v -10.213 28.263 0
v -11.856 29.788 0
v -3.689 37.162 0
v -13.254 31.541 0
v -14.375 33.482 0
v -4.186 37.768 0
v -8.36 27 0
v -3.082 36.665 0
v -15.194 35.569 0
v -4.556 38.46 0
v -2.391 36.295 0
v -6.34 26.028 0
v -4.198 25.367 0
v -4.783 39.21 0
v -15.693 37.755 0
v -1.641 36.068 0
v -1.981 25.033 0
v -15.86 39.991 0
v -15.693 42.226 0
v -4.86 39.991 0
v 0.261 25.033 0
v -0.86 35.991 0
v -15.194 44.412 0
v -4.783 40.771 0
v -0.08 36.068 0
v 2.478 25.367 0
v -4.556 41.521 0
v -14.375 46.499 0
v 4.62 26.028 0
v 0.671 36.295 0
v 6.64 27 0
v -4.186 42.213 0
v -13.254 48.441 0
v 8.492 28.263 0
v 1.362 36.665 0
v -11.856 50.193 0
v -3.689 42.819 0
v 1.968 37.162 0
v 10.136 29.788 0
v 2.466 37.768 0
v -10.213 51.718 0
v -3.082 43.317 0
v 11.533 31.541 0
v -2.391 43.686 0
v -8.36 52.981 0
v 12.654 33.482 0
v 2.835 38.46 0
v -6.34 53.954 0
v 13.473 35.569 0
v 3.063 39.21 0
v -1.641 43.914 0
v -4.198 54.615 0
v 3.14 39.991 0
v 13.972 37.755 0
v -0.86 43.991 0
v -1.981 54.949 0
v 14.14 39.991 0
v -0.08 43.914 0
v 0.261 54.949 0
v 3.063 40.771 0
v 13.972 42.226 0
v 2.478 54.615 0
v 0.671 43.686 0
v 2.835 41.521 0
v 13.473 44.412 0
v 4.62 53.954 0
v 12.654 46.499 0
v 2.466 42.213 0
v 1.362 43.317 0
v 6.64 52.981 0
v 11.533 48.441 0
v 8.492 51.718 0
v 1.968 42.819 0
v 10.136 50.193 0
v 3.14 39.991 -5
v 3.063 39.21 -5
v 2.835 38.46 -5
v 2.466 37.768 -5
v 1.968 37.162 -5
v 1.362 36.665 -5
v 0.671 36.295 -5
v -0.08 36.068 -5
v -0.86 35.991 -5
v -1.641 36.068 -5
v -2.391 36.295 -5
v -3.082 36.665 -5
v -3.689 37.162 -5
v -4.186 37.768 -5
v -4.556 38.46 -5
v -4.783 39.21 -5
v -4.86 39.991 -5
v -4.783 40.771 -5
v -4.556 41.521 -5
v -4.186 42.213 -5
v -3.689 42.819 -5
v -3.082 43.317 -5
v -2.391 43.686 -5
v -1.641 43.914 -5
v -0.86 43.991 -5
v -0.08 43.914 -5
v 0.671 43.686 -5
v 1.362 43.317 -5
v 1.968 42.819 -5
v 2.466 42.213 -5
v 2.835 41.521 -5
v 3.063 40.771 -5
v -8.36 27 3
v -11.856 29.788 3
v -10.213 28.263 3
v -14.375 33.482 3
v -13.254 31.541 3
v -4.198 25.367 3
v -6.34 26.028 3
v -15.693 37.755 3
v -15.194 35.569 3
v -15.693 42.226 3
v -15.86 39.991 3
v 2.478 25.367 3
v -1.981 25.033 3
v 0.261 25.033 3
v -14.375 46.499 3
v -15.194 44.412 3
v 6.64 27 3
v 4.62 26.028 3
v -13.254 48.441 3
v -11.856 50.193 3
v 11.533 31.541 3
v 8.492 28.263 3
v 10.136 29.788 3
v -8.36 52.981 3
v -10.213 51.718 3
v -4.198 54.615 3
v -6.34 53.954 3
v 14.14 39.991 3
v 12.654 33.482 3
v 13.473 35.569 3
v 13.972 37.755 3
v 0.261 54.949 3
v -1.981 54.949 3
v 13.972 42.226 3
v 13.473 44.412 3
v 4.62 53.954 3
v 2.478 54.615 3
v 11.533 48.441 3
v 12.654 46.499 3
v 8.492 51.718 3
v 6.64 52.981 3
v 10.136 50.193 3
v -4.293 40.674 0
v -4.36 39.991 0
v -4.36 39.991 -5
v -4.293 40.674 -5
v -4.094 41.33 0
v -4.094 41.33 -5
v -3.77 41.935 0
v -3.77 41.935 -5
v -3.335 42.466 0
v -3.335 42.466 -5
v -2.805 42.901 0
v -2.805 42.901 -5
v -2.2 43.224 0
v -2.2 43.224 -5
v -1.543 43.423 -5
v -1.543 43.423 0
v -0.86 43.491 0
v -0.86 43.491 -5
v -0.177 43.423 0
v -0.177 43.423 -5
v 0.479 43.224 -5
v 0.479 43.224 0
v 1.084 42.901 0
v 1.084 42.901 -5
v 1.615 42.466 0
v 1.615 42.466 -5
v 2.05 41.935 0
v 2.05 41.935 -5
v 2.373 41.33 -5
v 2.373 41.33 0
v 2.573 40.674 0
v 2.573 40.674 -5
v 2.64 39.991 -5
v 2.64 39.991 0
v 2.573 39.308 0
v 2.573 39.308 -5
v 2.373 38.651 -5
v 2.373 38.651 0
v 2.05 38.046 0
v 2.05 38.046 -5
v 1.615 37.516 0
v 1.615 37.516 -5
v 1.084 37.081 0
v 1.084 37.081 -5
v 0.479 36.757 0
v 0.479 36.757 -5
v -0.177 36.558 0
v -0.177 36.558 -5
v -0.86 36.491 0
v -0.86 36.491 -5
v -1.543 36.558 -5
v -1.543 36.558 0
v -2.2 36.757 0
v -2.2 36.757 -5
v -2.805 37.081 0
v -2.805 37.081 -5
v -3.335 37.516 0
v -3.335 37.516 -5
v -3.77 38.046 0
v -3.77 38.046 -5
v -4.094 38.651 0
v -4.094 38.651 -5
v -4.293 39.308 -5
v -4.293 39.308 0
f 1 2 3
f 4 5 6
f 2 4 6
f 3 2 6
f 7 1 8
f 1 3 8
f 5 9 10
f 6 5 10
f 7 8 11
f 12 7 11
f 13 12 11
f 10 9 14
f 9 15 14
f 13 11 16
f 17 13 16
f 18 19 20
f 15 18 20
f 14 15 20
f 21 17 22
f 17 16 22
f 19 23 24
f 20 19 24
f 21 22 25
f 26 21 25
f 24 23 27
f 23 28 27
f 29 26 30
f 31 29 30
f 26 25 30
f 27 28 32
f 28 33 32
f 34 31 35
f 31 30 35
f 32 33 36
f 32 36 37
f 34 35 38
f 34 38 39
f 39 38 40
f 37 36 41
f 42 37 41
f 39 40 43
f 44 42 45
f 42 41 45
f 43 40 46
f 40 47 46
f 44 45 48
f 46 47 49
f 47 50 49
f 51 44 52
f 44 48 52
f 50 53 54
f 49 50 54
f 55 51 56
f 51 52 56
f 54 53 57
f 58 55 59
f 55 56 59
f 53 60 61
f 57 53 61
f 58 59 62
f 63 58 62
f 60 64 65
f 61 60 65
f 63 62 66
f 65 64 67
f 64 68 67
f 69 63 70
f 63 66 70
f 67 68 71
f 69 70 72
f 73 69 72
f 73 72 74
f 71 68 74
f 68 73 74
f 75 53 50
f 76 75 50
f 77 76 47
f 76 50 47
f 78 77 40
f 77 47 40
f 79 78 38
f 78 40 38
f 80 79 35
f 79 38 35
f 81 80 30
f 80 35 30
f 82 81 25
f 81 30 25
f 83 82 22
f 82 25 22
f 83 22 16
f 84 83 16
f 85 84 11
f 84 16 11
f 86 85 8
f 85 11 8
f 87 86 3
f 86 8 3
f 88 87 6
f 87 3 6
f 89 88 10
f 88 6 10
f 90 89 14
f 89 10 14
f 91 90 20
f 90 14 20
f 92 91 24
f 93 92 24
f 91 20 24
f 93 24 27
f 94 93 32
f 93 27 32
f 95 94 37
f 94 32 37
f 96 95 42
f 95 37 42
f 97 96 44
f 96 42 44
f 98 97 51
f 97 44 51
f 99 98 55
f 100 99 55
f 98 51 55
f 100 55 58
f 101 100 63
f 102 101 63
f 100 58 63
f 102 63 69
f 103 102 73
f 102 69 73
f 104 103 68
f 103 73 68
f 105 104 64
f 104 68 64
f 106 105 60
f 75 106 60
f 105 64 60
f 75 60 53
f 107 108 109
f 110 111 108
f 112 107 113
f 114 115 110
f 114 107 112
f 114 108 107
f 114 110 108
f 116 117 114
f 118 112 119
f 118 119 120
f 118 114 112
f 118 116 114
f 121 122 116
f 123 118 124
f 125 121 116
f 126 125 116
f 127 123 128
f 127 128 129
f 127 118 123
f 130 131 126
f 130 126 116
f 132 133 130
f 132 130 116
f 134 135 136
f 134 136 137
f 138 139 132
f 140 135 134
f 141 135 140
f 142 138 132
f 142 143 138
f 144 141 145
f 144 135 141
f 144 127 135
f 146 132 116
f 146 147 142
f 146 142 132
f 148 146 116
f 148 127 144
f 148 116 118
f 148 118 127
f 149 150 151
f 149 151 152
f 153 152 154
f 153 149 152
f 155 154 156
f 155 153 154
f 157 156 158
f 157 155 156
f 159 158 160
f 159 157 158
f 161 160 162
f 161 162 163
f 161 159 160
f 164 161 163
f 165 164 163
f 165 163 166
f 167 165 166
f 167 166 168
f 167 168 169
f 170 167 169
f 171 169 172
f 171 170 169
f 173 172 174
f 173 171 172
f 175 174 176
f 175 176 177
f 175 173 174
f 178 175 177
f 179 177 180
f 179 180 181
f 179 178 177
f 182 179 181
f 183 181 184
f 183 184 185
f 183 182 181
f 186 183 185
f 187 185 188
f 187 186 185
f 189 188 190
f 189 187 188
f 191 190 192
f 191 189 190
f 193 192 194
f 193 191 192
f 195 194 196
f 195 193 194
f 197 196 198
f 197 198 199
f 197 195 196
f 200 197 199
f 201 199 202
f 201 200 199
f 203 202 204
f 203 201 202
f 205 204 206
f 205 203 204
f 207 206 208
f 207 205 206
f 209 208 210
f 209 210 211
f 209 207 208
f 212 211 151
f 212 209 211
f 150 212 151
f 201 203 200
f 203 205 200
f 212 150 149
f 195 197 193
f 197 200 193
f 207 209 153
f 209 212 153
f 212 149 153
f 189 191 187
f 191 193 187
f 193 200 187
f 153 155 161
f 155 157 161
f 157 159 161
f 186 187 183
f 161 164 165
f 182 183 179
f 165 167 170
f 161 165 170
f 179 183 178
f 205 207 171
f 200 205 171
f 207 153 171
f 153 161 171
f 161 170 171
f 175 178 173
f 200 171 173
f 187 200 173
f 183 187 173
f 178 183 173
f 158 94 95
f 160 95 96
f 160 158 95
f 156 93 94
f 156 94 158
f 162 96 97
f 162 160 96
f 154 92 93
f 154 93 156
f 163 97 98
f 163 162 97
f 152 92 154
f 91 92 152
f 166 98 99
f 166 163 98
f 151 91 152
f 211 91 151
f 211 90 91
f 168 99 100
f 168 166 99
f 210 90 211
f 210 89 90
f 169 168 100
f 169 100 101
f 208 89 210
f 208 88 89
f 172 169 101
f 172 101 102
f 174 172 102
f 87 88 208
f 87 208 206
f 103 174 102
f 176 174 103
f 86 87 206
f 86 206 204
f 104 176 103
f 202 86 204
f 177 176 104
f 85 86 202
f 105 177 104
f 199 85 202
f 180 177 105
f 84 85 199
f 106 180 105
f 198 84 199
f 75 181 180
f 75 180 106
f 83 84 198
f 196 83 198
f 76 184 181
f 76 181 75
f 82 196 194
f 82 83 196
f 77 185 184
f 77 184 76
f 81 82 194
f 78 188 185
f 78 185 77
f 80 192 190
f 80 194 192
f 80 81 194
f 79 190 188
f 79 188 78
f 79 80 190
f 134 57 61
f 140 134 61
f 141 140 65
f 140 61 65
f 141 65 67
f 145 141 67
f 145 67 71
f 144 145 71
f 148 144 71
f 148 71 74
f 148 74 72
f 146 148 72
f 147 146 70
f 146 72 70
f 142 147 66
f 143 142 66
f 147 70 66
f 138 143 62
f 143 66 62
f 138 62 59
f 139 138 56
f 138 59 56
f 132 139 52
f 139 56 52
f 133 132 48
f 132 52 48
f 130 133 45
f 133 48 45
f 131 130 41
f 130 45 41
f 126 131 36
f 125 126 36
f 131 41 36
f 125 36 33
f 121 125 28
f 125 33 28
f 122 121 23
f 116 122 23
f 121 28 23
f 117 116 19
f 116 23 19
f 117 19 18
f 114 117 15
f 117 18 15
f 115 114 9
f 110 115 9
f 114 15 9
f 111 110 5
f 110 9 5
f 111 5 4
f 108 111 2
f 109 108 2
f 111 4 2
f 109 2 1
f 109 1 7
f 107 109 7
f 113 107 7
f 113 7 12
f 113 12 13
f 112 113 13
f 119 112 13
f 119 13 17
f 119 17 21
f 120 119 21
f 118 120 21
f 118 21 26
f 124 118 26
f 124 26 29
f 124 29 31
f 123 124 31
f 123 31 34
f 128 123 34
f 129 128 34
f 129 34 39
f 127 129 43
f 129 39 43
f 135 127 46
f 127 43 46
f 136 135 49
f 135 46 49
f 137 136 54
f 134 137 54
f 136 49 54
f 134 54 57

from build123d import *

# Parameters (mm, degrees)
SKETCH1_R           = 15
SKETCH1_R_2         = 4
BOSS_EXTRUDE1_DEPTH = 3
SKETCH2_R           = 4
SKETCH2_R_2         = 3.5
BOSS_EXTRUDE2_DEPTH = 5
SKETCH4_R           = 4
BOSS_EXTRUDE4_DEPTH = 3


with BuildPart() as part:
    # Sketch1 → Boss-Extrude1 (new body)
    with BuildSketch(Plane.XY):
        with Locations((-0.860205172, 39.990749519)):
            Circle(SKETCH1_R)
        with Locations((-0.860205172, 39.990749519)):
            Circle(SKETCH1_R_2, mode=Mode.SUBTRACT)
    extrude(amount=BOSS_EXTRUDE1_DEPTH)



with BuildPart() as body_2:
    # Sketch2 → Boss-Extrude2 (new body)
    with BuildSketch(Plane(origin=(0, 0, 0), x_dir=(-1, 0, 0), z_dir=(0, 0, -1))):
        with Locations(Location((0.860205172, 39.990749519, 0), (0, 0, 180))):
            Circle(SKETCH2_R)
        with Locations((0.860205172, 39.990749519)):
            Circle(SKETCH2_R_2, mode=Mode.SUBTRACT)
    extrude(amount=BOSS_EXTRUDE2_DEPTH)


with BuildPart() as part_1:
    add(part.part)

    add(body_2.part)  # Boss-Extrude4 merges body 2
    # Sketch4 → Boss-Extrude4 (add)
    with BuildSketch(Plane.XY):
        with Locations((-0.860205172, 39.990749519)):
            Circle(SKETCH4_R)
    extrude(amount=BOSS_EXTRUDE4_DEPTH)


solid = part_1.part
